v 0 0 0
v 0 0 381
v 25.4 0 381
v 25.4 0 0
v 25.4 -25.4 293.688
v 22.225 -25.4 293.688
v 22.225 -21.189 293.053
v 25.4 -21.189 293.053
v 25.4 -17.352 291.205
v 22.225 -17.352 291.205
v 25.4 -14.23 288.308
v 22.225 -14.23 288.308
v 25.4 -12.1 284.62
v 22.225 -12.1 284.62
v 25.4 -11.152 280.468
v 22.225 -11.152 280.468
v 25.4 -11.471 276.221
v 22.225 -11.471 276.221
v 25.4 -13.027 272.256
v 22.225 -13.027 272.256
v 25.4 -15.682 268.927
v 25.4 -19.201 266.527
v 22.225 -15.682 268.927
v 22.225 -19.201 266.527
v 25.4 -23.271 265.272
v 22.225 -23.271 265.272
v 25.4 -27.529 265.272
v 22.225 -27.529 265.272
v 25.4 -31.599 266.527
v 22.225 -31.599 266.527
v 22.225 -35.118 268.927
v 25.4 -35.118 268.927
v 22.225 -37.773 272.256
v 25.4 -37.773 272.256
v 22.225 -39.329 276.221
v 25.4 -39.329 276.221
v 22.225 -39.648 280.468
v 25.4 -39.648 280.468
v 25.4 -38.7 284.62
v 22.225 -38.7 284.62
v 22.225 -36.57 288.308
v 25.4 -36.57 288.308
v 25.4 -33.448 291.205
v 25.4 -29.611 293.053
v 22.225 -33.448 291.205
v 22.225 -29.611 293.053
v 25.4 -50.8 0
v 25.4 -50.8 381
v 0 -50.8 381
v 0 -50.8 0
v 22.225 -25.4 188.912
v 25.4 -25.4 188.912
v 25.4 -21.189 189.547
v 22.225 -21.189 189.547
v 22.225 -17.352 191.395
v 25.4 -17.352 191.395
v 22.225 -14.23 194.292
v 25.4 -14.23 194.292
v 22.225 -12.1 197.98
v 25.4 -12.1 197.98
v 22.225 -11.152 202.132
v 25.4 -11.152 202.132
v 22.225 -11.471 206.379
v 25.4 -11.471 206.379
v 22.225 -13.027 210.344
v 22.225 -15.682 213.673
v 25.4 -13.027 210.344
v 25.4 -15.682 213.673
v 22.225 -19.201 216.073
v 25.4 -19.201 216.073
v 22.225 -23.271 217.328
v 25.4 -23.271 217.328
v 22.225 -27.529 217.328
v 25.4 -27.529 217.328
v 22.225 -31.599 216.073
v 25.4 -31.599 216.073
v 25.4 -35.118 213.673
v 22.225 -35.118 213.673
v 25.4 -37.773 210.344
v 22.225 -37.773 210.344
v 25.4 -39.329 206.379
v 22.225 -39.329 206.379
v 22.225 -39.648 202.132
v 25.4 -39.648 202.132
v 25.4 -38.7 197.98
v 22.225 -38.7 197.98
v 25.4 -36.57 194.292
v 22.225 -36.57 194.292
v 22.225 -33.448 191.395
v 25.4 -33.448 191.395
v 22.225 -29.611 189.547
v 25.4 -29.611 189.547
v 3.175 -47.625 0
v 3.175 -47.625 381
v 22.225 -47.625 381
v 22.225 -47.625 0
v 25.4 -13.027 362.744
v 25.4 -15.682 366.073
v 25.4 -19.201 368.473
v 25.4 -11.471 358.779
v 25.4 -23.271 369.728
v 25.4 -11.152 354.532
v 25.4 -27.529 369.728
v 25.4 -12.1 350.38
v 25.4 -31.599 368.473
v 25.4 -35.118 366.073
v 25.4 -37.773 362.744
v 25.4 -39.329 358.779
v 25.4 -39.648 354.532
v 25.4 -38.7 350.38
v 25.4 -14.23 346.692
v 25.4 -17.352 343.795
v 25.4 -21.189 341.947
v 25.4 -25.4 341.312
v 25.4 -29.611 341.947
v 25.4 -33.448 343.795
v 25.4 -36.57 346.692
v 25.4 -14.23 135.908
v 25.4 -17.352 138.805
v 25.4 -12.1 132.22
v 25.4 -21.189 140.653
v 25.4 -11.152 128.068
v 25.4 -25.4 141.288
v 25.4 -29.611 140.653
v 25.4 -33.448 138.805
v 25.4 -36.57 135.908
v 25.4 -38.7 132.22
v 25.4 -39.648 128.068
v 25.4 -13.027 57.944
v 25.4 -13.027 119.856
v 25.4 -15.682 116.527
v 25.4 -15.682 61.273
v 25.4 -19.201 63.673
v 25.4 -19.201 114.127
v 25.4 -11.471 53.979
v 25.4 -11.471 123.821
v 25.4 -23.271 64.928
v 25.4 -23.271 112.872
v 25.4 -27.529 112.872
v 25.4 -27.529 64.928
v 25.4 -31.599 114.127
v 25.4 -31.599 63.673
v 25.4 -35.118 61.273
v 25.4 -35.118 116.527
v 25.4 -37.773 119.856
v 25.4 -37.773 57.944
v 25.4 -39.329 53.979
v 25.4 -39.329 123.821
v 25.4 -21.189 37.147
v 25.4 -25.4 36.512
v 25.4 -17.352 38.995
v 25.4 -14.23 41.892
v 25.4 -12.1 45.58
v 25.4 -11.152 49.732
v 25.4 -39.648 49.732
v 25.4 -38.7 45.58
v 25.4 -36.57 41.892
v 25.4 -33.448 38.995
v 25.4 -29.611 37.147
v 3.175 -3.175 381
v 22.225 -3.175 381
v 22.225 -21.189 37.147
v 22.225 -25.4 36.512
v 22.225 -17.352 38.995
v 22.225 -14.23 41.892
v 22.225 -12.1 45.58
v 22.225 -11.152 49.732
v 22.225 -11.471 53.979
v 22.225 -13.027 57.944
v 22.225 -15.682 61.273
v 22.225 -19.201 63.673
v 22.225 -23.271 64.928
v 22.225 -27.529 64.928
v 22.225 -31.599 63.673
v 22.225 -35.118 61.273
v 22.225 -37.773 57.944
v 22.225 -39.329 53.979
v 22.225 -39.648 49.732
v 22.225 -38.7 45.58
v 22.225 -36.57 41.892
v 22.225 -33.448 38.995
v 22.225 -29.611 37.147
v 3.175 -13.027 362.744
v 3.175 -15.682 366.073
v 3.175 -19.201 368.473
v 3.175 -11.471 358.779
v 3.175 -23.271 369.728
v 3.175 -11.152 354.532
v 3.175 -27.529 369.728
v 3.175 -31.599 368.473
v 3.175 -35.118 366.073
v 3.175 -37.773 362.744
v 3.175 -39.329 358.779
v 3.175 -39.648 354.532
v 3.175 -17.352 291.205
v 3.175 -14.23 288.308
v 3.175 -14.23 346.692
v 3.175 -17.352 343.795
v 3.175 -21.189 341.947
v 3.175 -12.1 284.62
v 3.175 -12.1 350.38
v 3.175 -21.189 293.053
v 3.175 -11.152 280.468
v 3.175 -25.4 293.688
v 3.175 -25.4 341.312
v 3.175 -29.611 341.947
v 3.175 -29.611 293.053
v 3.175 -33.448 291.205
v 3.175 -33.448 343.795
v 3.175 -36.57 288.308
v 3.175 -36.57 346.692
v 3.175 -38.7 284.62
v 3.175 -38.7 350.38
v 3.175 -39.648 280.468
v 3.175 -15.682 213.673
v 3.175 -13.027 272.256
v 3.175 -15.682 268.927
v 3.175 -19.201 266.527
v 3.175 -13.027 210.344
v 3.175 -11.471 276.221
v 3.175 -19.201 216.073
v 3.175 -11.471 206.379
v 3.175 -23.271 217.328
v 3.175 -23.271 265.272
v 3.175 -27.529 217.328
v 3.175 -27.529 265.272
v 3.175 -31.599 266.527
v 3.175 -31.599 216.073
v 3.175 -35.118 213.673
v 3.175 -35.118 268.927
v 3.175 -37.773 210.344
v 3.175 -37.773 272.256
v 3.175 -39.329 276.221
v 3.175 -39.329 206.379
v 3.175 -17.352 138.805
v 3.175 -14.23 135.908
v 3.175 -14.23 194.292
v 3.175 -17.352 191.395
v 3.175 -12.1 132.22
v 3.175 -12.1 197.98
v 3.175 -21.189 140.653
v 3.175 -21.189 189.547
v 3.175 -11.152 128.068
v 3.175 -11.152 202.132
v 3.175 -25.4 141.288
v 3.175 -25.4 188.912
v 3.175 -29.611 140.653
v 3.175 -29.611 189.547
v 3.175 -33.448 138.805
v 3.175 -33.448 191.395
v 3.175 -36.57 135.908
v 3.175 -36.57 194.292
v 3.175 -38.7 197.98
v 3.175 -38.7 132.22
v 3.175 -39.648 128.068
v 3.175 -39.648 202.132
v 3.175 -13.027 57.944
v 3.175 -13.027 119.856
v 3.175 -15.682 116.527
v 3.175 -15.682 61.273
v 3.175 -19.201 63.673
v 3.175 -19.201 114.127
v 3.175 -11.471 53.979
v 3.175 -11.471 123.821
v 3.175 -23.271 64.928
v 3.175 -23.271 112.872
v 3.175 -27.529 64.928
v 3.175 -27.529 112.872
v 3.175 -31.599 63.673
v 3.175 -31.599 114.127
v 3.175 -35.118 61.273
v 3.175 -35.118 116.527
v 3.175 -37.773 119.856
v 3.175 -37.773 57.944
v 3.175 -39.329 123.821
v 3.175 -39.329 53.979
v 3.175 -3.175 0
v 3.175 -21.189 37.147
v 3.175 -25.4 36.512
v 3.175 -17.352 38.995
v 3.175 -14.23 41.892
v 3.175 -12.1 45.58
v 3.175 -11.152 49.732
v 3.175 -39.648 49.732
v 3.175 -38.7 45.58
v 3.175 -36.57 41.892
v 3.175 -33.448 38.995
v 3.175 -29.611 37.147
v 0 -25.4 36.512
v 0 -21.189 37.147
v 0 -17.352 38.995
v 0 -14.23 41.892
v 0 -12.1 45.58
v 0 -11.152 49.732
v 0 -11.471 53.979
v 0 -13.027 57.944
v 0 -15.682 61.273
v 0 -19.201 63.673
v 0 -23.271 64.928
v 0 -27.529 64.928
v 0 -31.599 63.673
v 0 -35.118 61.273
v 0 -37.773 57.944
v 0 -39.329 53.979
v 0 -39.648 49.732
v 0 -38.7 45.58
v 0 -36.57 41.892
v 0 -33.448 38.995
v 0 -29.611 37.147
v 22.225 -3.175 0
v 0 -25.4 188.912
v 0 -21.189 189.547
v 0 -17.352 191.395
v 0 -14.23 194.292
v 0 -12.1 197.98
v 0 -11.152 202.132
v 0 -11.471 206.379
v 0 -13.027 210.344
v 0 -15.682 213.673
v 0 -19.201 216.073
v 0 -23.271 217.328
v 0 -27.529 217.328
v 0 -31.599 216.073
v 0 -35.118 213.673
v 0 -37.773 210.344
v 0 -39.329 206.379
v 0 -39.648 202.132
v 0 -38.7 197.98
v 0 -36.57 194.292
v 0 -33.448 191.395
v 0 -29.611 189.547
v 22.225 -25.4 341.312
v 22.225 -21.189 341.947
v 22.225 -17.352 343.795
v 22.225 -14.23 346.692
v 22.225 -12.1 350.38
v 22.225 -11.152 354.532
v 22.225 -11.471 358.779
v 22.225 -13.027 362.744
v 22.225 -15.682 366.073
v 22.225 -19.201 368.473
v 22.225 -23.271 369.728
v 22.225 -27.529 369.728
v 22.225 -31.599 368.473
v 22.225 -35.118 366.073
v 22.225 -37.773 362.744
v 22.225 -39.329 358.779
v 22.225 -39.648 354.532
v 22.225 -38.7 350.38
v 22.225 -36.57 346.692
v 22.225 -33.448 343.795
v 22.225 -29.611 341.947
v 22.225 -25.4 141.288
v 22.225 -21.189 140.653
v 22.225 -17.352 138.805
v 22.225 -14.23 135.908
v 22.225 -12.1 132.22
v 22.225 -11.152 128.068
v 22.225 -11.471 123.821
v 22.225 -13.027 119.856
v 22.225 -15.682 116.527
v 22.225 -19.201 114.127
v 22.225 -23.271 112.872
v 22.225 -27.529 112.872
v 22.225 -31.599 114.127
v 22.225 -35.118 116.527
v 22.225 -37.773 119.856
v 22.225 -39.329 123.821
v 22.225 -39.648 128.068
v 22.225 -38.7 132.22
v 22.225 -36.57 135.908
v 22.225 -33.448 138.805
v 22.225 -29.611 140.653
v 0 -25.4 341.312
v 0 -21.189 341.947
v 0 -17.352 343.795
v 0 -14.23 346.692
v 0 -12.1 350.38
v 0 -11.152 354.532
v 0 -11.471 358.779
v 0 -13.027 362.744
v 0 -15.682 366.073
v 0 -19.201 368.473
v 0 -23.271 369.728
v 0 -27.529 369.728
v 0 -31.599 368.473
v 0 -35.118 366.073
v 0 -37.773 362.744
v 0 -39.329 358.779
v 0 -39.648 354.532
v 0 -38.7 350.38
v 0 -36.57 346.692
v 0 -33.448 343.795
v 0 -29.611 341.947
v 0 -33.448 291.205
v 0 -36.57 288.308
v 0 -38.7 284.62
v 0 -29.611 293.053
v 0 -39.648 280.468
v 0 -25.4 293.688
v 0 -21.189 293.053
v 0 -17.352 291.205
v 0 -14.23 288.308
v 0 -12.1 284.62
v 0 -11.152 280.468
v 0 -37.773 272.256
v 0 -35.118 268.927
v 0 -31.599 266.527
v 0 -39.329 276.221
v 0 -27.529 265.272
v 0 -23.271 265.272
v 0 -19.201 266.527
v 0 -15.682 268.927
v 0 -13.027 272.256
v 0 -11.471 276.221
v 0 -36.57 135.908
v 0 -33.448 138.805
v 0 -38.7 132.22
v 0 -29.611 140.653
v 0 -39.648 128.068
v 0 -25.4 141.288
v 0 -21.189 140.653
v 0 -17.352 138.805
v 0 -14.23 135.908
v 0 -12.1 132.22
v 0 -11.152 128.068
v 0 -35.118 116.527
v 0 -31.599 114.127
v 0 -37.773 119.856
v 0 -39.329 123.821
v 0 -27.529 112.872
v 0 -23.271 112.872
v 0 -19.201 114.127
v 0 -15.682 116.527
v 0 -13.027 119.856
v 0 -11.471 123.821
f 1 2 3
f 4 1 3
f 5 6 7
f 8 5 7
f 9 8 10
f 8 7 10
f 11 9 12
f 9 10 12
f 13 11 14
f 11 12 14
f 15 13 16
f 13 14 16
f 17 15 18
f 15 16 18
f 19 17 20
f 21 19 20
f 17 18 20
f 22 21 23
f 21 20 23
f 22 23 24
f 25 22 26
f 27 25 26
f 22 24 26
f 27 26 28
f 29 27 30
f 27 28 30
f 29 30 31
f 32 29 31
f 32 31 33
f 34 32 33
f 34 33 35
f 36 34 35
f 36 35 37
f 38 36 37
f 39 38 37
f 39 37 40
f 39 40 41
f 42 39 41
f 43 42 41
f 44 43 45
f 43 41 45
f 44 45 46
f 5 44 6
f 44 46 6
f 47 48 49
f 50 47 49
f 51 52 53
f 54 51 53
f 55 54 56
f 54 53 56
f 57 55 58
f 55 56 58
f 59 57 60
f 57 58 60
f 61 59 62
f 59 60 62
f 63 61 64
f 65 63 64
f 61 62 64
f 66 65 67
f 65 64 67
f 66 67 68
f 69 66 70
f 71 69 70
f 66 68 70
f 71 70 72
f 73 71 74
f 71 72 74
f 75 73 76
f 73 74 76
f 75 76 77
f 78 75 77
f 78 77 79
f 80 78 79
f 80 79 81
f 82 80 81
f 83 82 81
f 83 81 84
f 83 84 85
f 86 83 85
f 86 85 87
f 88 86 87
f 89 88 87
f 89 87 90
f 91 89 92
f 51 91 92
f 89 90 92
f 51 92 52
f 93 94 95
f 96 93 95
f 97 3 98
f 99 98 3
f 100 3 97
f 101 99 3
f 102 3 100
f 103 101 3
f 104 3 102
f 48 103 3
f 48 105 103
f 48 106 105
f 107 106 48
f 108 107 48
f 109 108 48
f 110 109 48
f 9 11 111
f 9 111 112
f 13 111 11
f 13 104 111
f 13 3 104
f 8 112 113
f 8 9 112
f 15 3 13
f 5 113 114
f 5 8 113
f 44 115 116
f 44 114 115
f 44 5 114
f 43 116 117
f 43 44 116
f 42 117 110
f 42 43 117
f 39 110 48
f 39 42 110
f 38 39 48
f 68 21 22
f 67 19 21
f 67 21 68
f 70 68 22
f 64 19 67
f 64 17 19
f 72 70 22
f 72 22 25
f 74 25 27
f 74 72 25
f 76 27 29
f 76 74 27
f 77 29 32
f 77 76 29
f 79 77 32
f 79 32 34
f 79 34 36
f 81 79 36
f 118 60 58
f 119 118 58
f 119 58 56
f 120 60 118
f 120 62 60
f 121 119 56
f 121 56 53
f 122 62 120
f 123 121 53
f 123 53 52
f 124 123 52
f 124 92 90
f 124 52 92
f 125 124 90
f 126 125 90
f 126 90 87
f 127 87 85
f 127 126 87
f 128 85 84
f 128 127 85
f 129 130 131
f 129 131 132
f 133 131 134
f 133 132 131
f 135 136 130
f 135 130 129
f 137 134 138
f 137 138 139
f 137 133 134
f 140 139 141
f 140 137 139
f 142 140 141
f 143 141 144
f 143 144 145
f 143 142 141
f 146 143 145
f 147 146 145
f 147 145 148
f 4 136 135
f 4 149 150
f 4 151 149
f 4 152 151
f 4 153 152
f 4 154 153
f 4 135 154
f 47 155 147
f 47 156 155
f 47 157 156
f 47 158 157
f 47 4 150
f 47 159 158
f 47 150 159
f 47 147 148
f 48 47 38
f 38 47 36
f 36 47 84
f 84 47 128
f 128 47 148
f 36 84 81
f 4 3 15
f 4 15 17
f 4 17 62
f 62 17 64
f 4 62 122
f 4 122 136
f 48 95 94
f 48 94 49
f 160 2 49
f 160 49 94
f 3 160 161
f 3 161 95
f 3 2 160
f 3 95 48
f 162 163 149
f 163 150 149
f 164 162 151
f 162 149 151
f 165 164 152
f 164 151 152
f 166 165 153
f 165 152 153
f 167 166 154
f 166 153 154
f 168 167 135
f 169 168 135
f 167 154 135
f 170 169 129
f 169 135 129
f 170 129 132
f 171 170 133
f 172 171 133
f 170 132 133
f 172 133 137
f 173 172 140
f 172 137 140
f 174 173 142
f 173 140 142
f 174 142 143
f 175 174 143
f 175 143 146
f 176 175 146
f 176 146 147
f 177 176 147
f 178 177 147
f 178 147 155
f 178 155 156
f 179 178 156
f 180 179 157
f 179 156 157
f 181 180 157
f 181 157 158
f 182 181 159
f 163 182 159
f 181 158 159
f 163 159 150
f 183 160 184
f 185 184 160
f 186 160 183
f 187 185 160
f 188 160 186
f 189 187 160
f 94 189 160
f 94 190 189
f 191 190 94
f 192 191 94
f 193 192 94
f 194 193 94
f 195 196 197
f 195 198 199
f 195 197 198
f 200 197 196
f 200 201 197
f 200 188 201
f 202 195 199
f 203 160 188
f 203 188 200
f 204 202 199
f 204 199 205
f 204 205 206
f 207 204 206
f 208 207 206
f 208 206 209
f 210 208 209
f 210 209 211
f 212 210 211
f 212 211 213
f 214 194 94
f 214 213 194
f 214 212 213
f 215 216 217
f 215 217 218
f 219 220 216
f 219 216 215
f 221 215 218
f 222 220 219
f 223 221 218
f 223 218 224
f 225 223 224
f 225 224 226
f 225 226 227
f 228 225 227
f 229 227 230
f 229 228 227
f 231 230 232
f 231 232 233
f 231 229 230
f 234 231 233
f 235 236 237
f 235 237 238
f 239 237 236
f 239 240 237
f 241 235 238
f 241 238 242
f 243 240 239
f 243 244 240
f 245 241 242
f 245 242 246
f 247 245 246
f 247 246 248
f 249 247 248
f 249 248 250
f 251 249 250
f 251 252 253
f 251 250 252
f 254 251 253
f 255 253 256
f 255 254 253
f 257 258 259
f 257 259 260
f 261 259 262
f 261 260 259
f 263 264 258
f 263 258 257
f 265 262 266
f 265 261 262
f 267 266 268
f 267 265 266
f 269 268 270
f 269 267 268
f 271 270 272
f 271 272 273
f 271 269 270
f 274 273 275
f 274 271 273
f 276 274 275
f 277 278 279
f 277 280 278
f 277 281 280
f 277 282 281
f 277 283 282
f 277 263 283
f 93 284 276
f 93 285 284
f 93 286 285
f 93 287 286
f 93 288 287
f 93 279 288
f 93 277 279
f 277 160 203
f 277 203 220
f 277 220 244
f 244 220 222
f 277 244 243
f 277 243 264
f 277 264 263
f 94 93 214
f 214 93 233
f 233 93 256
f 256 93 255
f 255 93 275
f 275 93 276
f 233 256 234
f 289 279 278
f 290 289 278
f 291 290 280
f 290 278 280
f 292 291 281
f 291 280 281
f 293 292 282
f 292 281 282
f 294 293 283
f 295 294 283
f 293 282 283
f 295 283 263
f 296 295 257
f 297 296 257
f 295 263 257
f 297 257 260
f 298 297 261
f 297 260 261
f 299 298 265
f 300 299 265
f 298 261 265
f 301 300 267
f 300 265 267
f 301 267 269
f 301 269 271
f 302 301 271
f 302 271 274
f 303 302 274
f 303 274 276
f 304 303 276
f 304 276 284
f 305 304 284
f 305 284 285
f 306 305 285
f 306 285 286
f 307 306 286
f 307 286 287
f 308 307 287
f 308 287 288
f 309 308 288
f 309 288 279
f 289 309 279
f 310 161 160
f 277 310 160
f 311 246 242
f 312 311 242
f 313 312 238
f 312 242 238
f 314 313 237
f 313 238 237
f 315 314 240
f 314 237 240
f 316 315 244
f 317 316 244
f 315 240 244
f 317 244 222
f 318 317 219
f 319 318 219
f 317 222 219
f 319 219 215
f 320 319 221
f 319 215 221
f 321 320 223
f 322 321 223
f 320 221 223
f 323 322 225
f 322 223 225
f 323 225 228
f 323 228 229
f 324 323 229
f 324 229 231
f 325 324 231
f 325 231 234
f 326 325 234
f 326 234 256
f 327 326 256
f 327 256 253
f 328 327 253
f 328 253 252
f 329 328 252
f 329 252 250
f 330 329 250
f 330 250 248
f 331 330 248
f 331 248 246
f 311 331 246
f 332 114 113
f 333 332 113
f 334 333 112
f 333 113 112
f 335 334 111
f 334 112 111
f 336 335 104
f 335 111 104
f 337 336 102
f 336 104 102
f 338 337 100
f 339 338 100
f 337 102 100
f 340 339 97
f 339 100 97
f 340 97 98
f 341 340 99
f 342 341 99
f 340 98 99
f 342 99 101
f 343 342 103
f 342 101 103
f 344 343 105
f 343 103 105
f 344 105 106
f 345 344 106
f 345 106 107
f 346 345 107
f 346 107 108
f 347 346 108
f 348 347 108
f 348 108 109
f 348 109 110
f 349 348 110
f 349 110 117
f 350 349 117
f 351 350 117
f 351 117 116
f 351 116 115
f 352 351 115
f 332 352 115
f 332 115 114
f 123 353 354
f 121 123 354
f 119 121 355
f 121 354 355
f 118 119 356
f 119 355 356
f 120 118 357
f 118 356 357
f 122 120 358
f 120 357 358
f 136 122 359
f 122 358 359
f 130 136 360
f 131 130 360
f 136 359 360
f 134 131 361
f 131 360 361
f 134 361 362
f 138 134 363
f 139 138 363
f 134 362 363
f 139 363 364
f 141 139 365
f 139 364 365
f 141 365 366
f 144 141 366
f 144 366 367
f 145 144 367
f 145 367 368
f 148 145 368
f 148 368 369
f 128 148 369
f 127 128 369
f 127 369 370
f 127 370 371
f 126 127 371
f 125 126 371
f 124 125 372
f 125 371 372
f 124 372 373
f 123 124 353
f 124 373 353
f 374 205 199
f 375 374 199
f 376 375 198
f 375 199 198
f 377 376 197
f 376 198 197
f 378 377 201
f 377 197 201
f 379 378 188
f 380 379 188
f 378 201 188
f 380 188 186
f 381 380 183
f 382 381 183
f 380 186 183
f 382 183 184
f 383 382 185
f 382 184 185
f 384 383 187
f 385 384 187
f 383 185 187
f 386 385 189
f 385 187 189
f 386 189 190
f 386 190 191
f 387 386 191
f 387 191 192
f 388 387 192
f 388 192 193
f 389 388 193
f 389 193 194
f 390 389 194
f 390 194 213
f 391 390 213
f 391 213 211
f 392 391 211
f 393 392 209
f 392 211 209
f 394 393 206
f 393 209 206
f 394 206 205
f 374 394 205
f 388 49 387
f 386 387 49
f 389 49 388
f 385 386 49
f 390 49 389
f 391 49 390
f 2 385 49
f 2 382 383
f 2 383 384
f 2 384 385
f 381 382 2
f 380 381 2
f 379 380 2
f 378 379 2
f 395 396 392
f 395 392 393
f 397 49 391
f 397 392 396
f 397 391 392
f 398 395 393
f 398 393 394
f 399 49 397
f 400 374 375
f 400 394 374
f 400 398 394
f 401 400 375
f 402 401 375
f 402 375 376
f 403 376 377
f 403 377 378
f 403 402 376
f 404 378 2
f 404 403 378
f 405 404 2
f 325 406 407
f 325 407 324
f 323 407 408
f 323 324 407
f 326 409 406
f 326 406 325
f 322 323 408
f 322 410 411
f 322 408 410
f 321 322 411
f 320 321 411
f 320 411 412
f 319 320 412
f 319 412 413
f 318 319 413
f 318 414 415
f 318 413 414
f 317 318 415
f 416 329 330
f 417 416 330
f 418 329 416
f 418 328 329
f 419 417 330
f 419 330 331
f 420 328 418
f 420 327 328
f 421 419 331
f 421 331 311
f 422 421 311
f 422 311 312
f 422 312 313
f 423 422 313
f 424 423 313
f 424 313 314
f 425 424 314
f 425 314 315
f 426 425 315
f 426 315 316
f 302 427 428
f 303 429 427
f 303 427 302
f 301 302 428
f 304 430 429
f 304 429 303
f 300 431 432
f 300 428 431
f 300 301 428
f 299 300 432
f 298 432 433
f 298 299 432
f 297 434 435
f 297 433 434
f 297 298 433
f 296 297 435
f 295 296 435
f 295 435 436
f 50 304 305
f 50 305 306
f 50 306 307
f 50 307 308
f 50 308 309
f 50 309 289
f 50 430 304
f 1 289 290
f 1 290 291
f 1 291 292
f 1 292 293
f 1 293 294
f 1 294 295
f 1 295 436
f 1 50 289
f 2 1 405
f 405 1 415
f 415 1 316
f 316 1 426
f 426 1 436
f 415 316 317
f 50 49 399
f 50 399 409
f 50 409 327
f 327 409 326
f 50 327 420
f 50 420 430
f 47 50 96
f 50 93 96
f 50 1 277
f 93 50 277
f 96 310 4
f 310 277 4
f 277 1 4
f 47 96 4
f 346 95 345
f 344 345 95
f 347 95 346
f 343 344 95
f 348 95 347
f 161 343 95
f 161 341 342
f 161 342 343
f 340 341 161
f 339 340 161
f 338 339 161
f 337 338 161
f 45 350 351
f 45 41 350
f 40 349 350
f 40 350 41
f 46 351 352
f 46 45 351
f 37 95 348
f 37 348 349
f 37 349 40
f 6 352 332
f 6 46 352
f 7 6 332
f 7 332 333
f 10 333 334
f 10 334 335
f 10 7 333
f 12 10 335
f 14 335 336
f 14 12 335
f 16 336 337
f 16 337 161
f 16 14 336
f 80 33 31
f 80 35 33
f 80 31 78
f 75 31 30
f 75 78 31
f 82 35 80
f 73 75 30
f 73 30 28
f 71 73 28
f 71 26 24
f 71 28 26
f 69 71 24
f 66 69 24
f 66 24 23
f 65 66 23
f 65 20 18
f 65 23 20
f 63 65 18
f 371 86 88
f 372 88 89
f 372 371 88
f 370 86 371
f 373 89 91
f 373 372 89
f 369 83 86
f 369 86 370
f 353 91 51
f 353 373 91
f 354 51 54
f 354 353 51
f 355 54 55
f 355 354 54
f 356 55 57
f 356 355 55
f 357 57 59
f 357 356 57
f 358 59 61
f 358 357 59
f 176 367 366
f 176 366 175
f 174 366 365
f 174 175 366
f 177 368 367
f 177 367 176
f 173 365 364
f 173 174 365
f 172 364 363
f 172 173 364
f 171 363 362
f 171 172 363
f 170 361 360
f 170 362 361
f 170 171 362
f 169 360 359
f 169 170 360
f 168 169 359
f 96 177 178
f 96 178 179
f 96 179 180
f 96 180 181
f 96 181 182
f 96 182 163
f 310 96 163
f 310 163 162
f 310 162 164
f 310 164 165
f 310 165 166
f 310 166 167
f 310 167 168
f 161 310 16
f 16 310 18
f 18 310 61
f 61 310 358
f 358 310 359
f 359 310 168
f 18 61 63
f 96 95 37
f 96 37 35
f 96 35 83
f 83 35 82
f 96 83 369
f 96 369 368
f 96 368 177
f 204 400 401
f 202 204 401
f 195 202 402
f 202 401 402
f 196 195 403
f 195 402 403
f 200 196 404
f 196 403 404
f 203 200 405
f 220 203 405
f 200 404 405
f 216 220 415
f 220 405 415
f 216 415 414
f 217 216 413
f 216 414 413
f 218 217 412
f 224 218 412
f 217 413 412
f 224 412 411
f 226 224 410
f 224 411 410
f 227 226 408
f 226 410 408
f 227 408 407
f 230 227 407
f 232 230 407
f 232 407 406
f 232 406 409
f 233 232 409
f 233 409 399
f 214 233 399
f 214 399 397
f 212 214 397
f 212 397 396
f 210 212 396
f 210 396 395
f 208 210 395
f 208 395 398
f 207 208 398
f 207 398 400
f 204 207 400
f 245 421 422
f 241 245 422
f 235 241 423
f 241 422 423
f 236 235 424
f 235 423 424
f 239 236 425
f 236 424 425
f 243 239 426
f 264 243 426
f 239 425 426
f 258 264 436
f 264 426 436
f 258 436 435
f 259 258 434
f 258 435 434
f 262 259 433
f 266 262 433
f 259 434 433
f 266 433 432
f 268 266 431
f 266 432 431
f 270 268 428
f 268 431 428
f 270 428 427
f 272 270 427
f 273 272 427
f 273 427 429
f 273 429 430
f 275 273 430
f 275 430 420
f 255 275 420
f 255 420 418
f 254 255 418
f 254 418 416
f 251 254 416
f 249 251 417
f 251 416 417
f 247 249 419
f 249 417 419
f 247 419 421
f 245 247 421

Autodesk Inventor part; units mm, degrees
ref_plane "YZ Plane" through (0, 0, 0) normal (1, 0, 0) x (0, 1, 0)
ref_plane "XZ Plane" through (0, 0, 0) normal (0, 1, 0) x (-1, 0, 0)
ref_plane "XY Plane" through (0, 0, 0) normal (0, 0, 1) x (1, 0, 0)
sketch "Sketch1" plane through (0, 0, 0) normal (0, 0, 1) x (1, 0, 0)
  line L0 (0, 0) -> (25.4, 0)
  line L1 (25.4, 0) -> (25.4, -50.8)
  line L2 (25.4, -50.8) -> (0, -50.8)
  line L3 (0, -50.8) -> (0, 0)
  line L4 (22.225, -3.175) -> (3.175, -3.175)
  line L5 (3.175, -3.175) -> (3.175, -47.625)
  line L6 (3.175, -47.625) -> (22.225, -47.625)
  line L7 (22.225, -47.625) -> (22.225, -3.175)
  dimension "d0" = 25.4
  dimension "d1" = 50.8
  dimension "d2" = 3.175
extrude "Extrusion1" add sketch "Sketch1" along normal blind 381
sketch "Sketch2" plane through (25.4, -50.8, 0) normal (1, 0, 0) x (0, 0, -1)
  circle A0 centre (-355.6, 25.4) radius 14.2875
  circle A1 centre (-203.2, 25.4) radius 14.2875
  circle A2 centre (-50.8, 25.4) radius 14.2875
  line L0 (0, 0) -> (-381, 0) projected
  line L1 (0, 50.8) -> (-381, 50.8) projected
  line L2 (0, 50.8) -> (0, 0) projected
  dimension "d6" = 28.575
  dimension "d7" = 28.575
  dimension "d8" = 28.575
  dimension "d10" = 25.4
  dimension "d11" = 25.4
  dimension "d12" = 25.4
  dimension "d13" = 50.8
  dimension "d14" = 152.4
  dimension "d15" = 152.4
extrude "Extrusion2" cut sketch "Sketch2" against normal blind 381
sketch "Sketch3" plane through (0, -50.8, 0) normal (-1, 0, 0) x (0, 0, 1)
  circle A0 centre (127, 25.4) radius 14.2875
  circle A1 centre (279.4, 25.4) radius 14.2875
  line L0 (0, 0) -> (381, 0) projected
  circle A2 centre (203.2, 25.4) radius 14.2875 projected
  circle A3 centre (355.6, 25.4) radius 14.2875 projected
  point P0 (0, 50.8)
  dimension "d19" = 28.575
  dimension "d20" = 28.575
  dimension "d21" = 25.4
  dimension "d22" = 25.4
  dimension "d23" = 76.2
  dimension "d24" = 76.2
  dimension "d25" = 76.2
extrude "Extrusion3" cut sketch "Sketch3" against normal blind 25.4 contours A0 | A1
properties part number "intake 1"
